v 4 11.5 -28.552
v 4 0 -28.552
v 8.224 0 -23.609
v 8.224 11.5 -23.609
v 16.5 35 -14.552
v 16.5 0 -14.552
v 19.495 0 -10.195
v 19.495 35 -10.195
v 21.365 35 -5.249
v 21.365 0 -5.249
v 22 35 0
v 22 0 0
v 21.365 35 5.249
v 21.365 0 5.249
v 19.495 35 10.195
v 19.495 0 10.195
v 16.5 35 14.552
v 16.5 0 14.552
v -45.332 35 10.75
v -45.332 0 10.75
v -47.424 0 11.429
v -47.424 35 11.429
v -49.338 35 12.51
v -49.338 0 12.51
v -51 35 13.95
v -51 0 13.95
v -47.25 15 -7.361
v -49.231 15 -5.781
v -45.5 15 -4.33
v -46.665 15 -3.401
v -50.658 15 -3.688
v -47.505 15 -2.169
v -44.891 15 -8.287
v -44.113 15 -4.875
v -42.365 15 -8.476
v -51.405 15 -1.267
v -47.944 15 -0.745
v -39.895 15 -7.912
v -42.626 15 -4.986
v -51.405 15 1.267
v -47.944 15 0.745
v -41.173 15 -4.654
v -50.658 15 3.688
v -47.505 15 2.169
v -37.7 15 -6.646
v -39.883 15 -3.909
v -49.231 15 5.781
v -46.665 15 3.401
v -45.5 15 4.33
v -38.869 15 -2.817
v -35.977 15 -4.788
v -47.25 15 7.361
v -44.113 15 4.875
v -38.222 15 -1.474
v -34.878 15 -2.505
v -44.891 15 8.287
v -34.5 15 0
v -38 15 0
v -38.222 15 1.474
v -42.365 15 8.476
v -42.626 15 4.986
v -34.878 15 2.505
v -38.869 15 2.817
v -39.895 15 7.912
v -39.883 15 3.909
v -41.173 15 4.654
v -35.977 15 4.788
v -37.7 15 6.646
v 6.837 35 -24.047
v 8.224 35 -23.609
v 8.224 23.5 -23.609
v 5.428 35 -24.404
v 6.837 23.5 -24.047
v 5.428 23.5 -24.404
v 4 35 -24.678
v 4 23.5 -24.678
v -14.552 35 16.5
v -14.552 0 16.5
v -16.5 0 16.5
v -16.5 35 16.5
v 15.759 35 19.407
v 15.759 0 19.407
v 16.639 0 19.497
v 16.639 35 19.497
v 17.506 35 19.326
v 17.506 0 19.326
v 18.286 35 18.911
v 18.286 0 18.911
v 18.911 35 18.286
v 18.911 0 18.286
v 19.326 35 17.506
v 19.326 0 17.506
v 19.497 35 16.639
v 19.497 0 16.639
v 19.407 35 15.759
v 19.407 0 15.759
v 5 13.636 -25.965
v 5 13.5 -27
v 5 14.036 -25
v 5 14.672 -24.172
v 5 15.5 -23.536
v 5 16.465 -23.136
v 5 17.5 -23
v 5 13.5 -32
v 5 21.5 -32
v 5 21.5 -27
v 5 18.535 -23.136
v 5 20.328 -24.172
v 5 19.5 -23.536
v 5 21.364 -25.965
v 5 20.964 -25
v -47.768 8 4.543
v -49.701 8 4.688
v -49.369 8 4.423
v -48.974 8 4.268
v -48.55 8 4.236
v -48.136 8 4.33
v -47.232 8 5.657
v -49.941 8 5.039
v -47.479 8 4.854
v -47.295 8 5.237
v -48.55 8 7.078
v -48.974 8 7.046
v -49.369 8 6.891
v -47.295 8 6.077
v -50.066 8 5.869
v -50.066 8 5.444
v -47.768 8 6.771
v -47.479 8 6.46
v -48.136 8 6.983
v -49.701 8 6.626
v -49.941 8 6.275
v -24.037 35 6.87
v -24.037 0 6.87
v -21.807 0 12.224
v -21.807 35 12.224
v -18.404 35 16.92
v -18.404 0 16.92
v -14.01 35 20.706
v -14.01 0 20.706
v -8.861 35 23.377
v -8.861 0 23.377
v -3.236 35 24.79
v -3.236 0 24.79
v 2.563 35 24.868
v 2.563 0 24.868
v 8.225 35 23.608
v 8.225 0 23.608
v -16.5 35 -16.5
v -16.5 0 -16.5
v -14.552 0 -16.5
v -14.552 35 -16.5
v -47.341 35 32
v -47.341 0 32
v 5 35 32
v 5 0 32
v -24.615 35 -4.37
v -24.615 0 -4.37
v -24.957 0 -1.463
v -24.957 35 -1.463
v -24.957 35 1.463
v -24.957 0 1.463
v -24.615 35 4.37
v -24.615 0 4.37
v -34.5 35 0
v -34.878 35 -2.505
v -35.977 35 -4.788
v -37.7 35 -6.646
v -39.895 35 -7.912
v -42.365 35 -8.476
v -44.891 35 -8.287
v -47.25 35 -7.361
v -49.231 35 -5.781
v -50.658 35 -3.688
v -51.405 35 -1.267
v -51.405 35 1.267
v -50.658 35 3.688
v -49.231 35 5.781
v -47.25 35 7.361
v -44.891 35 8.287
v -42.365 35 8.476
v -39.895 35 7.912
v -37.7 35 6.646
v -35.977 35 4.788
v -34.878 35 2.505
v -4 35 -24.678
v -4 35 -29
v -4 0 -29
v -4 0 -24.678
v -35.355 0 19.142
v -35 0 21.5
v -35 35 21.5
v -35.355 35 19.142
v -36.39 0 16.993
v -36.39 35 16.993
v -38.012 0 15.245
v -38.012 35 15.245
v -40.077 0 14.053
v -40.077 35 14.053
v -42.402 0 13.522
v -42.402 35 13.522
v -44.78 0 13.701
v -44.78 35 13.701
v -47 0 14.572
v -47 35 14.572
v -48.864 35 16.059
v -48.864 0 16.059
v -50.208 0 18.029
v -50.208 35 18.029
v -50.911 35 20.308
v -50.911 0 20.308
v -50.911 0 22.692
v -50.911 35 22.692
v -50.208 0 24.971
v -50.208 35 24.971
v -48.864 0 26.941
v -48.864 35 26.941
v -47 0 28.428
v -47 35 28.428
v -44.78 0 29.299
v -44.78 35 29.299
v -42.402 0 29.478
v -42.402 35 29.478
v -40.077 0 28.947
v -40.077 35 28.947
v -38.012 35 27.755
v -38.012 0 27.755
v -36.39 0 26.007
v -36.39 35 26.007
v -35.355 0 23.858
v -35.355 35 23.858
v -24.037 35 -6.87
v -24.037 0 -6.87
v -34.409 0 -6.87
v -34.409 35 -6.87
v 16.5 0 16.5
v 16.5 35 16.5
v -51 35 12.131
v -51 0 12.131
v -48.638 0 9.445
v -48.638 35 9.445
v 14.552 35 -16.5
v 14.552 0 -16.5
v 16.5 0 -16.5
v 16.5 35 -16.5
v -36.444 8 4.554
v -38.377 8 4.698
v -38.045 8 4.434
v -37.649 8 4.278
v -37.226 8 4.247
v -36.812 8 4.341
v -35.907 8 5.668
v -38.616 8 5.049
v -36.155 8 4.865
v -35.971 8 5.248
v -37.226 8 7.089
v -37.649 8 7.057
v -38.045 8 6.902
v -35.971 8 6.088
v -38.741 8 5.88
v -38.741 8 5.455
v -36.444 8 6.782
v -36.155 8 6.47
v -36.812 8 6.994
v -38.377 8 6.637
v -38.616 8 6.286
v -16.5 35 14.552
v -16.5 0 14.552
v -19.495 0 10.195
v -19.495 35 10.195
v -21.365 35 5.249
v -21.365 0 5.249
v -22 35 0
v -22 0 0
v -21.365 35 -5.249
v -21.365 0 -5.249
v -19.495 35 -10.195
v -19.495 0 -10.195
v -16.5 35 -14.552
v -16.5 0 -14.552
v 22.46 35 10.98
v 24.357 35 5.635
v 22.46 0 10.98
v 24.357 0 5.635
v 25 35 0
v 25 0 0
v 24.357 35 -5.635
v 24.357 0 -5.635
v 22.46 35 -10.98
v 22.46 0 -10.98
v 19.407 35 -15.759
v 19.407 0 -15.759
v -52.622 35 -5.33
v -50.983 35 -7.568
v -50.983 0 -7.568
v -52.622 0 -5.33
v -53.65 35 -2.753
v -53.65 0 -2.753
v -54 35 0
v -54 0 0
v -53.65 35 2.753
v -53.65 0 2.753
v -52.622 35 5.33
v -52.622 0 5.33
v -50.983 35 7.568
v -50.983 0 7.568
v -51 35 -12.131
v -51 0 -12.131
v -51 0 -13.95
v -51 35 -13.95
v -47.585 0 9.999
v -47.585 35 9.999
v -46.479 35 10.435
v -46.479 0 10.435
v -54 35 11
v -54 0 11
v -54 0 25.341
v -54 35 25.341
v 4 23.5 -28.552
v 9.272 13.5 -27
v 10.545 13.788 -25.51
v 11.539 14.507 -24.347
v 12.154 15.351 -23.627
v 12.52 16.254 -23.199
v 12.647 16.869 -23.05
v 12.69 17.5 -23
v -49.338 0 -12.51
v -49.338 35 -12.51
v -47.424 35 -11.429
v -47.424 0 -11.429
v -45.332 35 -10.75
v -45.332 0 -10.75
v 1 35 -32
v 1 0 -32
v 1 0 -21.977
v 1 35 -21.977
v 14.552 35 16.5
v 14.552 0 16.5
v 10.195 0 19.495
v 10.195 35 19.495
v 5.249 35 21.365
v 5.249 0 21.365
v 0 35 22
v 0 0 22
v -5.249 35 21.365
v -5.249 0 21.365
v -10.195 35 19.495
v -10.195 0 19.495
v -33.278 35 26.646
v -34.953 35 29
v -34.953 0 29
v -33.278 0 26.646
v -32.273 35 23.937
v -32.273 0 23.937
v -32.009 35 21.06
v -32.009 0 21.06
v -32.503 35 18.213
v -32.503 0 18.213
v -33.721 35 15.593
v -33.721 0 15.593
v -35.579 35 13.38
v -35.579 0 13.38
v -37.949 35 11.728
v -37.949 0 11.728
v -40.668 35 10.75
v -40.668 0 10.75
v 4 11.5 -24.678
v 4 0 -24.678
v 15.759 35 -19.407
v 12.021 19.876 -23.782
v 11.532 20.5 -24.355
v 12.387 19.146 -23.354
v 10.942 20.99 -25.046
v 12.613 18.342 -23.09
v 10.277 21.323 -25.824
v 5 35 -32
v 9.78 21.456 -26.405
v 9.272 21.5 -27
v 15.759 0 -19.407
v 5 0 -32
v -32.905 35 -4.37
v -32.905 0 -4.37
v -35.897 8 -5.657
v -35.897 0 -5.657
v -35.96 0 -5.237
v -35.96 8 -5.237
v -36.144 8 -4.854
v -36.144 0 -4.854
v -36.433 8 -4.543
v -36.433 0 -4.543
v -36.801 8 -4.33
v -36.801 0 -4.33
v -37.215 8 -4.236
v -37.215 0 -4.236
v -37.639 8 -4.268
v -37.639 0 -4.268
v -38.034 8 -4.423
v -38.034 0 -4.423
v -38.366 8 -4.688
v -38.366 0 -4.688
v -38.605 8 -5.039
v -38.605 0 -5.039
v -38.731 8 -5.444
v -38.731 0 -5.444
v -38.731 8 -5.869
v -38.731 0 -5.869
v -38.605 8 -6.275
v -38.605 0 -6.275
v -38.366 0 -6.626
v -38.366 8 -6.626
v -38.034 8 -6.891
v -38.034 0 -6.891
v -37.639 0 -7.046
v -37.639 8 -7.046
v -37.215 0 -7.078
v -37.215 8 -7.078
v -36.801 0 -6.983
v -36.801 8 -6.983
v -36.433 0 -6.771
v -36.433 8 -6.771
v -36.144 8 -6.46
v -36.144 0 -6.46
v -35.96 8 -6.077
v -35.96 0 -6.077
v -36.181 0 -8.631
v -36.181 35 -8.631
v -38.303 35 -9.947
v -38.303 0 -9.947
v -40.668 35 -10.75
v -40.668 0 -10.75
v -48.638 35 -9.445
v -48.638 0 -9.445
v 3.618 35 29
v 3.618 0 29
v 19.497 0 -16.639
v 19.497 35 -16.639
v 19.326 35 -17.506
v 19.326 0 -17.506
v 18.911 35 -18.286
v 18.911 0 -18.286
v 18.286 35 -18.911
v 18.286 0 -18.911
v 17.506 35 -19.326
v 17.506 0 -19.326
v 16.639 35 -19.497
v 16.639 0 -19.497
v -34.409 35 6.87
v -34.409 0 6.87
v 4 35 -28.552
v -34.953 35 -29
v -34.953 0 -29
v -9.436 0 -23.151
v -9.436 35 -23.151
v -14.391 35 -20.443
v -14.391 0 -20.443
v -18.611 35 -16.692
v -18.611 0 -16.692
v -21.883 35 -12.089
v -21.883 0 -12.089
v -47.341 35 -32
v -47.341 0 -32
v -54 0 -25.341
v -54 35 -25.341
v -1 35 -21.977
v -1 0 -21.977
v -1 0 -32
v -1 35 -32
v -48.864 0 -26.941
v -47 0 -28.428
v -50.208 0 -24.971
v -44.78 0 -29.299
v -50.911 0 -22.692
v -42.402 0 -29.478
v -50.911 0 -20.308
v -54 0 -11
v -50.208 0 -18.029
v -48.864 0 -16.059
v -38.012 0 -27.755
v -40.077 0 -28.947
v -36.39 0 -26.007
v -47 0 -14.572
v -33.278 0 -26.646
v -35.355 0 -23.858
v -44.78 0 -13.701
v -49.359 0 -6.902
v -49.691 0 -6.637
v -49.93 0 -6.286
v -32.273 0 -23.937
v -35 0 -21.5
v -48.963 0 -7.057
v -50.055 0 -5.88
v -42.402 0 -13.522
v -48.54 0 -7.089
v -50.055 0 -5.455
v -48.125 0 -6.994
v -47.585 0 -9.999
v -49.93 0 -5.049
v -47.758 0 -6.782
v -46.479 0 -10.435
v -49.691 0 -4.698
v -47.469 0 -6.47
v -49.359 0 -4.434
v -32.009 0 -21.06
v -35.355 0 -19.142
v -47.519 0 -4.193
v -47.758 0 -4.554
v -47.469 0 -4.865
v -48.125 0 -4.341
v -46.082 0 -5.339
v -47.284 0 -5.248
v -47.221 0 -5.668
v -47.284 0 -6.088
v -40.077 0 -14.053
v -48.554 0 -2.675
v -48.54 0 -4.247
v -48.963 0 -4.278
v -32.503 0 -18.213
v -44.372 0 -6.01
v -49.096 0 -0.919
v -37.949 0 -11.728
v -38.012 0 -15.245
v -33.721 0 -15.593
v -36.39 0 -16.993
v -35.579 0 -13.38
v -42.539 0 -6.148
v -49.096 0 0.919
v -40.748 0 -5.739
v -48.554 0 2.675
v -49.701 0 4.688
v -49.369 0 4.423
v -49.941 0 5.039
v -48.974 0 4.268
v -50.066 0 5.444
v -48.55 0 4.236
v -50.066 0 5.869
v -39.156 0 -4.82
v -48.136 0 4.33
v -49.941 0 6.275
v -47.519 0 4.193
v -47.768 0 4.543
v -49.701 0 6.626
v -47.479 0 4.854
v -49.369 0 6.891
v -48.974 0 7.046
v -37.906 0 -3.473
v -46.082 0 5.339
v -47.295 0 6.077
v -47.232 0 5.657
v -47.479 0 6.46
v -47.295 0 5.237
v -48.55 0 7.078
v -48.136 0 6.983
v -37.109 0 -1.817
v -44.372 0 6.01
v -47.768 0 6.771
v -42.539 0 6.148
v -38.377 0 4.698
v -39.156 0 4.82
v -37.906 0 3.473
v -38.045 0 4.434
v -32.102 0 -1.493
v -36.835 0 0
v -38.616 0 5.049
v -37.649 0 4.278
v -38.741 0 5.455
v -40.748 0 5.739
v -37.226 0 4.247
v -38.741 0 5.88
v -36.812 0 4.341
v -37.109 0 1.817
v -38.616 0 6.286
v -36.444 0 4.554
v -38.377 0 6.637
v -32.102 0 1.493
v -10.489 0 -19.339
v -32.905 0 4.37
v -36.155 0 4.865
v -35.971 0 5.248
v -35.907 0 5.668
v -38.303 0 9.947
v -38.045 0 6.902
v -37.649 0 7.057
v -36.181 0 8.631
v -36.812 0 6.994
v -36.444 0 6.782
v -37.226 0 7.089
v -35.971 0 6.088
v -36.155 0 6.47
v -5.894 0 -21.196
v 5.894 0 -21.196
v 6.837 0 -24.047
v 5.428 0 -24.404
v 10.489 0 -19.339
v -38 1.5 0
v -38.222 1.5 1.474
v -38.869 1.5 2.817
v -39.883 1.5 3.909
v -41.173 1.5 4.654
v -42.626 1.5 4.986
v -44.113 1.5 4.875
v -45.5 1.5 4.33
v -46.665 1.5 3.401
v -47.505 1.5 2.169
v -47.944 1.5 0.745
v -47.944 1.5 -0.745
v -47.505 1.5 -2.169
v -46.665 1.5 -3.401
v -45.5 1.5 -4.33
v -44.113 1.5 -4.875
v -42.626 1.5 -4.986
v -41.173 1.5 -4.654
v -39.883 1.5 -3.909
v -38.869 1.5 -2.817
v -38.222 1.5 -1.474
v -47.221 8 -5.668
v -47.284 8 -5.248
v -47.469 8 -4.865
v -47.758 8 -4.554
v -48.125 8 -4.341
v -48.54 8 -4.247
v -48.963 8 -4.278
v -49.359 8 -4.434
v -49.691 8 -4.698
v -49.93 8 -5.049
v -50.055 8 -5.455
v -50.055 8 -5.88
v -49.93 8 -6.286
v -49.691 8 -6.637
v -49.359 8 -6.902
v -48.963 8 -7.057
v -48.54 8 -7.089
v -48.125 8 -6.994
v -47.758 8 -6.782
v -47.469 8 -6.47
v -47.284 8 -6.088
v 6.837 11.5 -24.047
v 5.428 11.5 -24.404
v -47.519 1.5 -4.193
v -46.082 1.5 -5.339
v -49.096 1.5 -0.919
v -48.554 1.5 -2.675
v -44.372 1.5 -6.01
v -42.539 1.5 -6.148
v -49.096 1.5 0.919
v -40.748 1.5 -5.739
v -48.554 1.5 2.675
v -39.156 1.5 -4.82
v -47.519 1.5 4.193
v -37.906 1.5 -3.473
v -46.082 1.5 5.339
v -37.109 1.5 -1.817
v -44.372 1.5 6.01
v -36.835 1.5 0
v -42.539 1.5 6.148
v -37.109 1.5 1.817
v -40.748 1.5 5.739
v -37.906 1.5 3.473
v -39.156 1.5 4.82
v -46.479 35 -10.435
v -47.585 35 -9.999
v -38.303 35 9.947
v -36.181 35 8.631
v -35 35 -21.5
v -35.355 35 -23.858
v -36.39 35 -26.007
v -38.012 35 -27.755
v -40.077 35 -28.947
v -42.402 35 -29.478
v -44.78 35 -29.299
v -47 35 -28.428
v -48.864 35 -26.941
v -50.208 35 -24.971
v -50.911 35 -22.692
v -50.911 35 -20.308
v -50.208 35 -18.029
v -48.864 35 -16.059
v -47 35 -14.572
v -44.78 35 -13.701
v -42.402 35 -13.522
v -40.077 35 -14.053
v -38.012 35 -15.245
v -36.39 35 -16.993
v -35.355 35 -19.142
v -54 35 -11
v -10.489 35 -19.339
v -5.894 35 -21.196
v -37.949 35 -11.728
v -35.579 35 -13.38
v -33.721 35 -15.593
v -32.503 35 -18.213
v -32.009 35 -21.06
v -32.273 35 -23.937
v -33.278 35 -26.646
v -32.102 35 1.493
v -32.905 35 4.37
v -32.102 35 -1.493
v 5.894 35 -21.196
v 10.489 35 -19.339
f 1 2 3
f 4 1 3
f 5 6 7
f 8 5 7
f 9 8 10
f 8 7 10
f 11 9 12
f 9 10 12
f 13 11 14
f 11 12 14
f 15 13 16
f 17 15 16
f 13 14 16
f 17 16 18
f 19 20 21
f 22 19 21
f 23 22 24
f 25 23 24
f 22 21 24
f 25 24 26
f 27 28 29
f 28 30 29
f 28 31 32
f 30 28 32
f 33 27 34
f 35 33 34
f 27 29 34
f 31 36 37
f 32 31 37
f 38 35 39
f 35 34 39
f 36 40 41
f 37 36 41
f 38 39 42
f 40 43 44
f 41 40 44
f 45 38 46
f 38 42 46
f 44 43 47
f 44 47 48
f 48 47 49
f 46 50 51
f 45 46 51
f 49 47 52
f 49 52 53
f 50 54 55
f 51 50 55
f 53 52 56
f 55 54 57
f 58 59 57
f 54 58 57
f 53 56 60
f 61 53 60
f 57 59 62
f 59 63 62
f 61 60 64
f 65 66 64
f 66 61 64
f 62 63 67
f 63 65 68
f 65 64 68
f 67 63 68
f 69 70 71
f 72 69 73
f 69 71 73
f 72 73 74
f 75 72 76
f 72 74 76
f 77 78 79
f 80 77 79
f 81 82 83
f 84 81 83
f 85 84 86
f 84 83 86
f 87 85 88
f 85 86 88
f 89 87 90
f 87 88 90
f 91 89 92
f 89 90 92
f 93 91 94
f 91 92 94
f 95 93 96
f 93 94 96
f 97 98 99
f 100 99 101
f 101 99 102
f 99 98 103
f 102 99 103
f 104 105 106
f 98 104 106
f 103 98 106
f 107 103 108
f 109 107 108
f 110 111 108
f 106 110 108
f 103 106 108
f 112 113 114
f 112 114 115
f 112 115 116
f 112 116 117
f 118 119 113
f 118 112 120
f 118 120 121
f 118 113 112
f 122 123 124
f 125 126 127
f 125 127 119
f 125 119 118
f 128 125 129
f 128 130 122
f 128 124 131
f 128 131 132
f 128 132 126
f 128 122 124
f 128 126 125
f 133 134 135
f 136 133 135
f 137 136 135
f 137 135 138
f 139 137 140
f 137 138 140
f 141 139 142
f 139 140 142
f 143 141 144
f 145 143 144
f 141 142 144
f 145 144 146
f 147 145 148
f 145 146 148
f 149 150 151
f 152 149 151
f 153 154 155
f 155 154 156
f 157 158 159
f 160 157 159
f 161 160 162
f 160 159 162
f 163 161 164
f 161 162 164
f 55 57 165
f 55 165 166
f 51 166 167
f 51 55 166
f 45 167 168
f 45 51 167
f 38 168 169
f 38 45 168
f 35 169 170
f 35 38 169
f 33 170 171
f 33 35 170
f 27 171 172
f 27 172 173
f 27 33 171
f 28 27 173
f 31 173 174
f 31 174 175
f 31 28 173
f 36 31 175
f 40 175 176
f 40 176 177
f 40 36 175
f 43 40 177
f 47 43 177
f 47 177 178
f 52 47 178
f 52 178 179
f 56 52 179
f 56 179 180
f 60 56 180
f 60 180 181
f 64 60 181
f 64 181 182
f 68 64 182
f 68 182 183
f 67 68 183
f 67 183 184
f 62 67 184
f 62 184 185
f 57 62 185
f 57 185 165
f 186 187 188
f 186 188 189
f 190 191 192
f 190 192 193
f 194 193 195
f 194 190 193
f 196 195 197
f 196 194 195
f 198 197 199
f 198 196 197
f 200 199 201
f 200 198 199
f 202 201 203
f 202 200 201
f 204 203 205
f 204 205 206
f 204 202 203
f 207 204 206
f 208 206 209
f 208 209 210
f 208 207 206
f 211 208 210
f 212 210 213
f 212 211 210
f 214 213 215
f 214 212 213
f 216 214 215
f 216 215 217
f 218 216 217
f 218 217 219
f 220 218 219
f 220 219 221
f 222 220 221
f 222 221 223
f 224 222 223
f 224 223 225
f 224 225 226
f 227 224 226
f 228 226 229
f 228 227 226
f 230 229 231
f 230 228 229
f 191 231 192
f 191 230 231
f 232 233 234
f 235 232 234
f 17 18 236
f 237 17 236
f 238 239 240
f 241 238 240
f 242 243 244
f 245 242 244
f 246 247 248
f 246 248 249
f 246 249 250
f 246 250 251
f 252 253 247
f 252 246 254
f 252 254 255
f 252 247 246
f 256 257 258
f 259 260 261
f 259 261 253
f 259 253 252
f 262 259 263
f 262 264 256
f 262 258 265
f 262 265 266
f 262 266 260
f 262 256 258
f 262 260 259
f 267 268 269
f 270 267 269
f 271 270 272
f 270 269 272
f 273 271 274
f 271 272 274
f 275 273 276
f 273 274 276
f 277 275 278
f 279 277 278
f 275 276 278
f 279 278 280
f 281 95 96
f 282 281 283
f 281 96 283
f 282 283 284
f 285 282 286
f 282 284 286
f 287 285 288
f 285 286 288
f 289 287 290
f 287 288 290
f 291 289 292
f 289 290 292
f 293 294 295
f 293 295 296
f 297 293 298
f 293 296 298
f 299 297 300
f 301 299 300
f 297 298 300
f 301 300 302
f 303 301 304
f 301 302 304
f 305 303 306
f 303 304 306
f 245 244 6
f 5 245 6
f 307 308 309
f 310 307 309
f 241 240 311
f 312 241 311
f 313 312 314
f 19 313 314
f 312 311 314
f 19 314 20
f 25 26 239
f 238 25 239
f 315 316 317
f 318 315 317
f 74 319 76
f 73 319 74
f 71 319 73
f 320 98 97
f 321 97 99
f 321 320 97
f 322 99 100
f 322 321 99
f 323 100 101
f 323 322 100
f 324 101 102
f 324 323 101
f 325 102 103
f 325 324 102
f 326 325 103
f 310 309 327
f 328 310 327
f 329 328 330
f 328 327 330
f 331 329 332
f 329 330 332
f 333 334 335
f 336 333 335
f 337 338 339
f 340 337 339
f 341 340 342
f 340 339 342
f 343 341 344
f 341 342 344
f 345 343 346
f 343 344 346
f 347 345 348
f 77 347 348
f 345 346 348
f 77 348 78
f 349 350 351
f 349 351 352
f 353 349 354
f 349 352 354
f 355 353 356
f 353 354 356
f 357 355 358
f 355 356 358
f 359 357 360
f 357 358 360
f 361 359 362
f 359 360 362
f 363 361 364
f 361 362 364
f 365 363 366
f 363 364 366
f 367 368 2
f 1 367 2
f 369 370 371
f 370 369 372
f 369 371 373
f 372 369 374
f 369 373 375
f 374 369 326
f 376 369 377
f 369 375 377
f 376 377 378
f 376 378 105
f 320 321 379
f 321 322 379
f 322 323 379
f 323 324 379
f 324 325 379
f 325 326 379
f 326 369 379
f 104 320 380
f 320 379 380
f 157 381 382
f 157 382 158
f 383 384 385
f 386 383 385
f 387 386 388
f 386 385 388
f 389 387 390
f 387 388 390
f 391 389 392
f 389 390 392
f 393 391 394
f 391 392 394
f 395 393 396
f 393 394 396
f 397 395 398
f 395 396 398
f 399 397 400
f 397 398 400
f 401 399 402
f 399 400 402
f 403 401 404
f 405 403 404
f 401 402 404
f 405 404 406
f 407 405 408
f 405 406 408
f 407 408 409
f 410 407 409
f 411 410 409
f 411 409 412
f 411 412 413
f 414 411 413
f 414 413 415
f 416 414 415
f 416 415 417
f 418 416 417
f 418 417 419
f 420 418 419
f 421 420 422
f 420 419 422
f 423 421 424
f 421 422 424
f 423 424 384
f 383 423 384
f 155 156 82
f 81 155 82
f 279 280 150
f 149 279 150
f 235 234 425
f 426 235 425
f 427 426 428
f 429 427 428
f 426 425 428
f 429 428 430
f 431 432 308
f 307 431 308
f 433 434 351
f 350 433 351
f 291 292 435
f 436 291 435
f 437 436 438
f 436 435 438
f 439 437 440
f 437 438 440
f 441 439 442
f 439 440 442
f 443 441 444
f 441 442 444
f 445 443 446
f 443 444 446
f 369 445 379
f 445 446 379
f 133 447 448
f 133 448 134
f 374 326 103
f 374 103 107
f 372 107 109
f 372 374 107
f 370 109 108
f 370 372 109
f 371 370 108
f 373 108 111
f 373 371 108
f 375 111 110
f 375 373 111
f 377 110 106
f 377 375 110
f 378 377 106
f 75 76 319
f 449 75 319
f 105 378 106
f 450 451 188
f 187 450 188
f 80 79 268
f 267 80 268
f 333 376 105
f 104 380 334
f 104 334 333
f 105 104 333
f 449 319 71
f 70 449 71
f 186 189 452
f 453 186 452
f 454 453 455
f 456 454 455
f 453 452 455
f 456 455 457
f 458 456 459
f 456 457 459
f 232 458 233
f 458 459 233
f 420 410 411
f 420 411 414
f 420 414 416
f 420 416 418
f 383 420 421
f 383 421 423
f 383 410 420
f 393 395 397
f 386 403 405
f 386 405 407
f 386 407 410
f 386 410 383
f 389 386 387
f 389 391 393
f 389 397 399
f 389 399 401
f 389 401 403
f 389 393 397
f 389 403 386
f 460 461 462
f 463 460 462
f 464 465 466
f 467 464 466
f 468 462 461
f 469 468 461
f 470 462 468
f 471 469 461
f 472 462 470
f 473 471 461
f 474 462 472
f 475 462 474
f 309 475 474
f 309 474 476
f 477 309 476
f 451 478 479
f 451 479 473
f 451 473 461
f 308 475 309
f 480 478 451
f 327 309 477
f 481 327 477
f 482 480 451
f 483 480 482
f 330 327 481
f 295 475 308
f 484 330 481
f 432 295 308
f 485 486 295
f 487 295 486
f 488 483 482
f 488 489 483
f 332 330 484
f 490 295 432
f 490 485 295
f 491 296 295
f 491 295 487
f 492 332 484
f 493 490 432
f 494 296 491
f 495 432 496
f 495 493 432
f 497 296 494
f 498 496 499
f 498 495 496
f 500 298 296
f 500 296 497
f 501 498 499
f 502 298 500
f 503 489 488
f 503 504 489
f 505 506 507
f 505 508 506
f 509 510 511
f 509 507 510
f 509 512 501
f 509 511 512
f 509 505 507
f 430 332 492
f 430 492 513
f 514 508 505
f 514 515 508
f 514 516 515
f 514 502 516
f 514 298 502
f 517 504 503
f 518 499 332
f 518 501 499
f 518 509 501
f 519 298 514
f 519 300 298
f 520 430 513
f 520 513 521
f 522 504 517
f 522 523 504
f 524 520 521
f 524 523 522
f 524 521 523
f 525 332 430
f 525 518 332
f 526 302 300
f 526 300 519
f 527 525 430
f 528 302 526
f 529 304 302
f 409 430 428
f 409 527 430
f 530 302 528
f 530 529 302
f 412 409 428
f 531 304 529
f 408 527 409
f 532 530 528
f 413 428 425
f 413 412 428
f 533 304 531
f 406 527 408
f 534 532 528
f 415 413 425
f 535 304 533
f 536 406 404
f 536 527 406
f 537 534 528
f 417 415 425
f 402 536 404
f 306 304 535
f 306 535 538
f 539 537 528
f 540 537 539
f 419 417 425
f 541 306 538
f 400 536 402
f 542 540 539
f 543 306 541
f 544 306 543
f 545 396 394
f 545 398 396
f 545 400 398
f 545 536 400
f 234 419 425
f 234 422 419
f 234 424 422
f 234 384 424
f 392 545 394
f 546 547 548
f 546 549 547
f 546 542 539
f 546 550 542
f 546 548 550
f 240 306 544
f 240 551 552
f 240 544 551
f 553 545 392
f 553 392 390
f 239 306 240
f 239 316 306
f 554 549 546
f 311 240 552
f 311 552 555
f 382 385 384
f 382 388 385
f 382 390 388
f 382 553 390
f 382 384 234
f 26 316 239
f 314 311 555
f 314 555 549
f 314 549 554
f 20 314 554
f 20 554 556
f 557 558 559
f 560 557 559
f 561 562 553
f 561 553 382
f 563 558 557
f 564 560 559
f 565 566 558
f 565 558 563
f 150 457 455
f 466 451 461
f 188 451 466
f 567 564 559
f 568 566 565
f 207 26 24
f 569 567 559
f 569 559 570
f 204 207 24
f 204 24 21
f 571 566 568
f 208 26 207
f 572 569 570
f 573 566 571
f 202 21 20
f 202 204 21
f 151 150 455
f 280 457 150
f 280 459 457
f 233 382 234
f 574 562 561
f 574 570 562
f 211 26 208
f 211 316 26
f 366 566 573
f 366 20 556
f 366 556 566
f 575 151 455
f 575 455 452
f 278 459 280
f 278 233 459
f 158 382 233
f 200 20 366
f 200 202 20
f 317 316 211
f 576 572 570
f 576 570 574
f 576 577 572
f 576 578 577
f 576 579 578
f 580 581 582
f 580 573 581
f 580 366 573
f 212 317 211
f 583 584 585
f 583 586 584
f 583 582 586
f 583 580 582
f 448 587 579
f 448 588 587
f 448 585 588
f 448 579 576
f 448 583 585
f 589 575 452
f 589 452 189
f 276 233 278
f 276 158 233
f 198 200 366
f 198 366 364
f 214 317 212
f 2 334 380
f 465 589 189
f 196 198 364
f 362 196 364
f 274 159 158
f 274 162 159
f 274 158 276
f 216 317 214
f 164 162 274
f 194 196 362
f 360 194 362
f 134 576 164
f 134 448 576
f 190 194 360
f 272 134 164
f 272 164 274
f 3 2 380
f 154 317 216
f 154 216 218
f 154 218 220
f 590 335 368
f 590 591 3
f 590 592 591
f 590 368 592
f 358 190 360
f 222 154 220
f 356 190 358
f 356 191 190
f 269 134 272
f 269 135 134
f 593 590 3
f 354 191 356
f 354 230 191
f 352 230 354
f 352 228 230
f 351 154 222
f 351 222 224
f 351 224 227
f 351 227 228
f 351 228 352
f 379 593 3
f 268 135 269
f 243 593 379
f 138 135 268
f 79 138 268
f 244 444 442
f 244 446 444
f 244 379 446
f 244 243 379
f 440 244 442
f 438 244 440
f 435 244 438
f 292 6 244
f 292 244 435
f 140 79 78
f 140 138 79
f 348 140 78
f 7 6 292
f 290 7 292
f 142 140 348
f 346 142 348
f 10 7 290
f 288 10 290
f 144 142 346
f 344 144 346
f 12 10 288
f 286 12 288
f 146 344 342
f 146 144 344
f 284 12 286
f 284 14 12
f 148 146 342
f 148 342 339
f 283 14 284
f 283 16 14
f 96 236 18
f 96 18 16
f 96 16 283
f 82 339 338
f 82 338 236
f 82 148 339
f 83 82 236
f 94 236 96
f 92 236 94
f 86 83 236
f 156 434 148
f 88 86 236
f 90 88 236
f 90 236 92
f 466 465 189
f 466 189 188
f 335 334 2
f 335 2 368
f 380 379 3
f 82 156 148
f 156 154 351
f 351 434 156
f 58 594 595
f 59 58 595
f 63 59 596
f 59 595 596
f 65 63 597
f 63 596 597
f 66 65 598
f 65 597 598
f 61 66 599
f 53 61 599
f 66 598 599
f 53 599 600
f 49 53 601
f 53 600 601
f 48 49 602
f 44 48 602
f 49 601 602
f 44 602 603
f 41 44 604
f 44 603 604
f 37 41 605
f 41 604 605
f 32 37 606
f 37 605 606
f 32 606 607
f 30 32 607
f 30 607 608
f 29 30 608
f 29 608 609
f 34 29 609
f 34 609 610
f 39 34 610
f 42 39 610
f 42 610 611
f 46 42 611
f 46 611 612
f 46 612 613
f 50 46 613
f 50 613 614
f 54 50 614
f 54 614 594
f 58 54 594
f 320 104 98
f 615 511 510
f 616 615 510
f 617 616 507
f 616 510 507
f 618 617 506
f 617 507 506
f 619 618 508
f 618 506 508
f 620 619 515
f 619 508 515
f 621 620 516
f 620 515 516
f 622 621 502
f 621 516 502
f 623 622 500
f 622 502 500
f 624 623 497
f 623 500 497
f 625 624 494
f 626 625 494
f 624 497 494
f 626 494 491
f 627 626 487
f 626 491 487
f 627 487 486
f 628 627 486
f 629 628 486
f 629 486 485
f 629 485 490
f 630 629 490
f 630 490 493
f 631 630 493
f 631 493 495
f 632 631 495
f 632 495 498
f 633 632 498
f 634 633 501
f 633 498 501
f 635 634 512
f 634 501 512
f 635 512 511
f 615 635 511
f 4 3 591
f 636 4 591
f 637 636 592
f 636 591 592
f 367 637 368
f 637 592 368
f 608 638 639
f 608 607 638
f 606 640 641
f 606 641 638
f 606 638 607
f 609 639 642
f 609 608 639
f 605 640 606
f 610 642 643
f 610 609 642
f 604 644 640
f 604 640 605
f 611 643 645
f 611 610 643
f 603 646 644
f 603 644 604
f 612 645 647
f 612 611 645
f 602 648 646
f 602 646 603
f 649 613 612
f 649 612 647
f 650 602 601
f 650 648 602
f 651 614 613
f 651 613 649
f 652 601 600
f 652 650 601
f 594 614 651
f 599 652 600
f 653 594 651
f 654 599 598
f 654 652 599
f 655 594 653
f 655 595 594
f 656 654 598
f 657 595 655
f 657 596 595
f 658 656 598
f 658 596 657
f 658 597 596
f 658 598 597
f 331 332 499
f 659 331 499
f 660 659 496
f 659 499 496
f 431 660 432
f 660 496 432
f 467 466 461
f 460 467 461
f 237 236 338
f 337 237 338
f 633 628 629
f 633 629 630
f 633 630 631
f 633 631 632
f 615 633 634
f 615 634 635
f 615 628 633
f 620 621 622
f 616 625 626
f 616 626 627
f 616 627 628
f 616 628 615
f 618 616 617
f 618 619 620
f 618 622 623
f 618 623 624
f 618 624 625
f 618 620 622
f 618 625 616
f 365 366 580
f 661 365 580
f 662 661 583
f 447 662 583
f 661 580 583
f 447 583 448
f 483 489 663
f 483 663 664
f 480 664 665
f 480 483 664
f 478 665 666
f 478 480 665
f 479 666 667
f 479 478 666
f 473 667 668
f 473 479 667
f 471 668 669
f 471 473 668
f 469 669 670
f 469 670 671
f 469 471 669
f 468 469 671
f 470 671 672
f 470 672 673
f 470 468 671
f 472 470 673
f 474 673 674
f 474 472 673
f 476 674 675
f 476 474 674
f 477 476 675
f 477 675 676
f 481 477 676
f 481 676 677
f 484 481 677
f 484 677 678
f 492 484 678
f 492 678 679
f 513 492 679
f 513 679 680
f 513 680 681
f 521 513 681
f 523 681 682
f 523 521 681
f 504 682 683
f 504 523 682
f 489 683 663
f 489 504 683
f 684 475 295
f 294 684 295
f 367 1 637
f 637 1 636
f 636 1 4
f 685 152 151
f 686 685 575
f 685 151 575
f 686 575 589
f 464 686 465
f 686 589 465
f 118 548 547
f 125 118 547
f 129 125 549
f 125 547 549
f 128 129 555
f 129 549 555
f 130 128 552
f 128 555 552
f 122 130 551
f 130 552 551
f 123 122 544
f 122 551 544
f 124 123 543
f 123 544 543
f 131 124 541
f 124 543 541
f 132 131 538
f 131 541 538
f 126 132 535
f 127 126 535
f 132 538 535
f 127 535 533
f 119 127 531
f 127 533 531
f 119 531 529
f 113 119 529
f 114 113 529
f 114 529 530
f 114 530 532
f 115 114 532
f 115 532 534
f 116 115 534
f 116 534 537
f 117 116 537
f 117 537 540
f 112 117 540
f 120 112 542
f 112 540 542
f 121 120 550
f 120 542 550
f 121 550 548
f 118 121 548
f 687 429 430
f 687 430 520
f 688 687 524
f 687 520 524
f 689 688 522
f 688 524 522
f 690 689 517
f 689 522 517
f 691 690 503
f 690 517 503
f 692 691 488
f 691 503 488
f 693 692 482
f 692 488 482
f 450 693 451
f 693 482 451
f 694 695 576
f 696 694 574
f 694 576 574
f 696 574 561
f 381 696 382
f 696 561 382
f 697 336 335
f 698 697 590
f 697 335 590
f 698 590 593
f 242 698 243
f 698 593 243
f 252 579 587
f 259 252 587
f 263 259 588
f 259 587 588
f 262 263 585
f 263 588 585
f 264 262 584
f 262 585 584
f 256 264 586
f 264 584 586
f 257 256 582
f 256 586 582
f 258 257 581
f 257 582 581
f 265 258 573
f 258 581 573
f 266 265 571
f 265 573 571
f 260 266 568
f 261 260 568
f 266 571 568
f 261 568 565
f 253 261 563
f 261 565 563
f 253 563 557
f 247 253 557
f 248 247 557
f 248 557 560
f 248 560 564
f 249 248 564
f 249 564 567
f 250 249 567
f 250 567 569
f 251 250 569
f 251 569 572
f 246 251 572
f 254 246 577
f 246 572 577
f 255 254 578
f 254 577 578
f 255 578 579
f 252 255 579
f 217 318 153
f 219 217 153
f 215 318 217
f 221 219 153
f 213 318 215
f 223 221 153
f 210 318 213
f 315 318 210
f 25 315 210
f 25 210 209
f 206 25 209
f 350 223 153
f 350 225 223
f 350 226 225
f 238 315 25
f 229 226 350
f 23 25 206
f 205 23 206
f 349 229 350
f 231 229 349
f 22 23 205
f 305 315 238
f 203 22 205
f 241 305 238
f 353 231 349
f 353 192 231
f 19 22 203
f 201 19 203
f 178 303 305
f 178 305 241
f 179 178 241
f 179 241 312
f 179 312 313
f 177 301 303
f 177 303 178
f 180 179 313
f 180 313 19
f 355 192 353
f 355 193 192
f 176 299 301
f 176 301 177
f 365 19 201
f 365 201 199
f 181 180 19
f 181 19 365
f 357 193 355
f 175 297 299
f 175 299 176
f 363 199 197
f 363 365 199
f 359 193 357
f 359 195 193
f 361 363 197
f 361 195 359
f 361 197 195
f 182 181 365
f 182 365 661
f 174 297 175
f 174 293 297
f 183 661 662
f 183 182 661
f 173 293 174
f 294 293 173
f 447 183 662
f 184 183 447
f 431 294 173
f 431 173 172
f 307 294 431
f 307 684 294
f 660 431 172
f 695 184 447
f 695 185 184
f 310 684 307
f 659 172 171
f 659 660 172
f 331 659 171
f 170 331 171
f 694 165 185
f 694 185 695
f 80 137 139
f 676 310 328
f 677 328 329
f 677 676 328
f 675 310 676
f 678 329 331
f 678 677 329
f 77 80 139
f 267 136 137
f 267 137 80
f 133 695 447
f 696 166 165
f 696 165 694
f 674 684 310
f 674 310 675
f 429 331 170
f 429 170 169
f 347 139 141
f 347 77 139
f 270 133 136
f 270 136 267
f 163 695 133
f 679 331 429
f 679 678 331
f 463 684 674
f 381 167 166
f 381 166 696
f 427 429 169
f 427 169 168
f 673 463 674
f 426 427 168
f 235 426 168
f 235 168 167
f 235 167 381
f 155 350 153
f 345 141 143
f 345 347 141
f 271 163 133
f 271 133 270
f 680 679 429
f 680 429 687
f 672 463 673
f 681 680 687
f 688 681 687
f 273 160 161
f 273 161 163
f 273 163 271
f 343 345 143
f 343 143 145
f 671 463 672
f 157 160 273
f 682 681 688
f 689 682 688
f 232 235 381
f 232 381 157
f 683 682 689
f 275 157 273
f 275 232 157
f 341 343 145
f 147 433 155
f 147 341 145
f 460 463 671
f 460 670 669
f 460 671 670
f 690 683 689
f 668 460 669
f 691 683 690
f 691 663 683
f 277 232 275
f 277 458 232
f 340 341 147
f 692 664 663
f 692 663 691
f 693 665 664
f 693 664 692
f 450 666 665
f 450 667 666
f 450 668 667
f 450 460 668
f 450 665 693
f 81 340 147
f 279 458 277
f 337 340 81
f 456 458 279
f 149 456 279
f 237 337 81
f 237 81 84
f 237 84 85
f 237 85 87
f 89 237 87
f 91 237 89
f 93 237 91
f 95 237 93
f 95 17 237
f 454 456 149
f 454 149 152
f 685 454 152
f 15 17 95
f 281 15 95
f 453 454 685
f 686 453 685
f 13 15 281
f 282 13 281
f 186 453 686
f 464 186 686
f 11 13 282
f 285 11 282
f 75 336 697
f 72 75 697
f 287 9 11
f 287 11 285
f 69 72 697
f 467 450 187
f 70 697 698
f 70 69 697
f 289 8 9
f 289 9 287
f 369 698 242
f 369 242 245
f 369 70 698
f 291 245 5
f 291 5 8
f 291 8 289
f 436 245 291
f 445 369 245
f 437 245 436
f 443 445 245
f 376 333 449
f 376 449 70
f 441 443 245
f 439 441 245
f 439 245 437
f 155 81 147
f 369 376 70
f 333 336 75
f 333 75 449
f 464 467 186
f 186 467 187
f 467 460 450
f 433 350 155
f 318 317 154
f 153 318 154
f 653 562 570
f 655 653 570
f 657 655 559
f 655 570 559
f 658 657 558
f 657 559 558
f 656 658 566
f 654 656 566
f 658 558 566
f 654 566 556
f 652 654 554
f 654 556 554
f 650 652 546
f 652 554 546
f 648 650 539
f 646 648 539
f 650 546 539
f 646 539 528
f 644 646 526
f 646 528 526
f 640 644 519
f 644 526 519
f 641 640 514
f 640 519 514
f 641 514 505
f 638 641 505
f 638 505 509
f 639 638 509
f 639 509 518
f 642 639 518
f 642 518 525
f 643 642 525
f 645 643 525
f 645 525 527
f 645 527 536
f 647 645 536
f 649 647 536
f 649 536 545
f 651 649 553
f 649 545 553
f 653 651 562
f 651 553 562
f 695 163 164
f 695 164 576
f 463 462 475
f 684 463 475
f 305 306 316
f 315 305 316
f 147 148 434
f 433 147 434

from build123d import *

# Parameters (mm, degrees)
SKETCH1_R           = 8
SKETCH1_R_2         = 8.5
BOSS_EXTRUDE1_DEPTH = 35
BOSS_EXTRUDE3_DEPTH = 12
CUT_EXTRUDE1_DEPTH  = 14.407172
SKETCH7_R           = 8.5
BOSS_EXTRUDE4_DEPTH = 15
SKETCH7_3_R         = 5
CUT_EXTRUDE2_DEPTH  = 15
SKETCH7_4_R         = 6.165
CUT_EXTRUDE3_DEPTH  = 1.5
SKETCH7_5_R         = 1.425
CUT_EXTRUDE4_DEPTH  = 8


with BuildPart() as part:
    # Sketch1 → Boss-Extrude1 (new body)
    with BuildSketch(Plane(origin=(0, 0, 0), x_dir=(1, 0, 0), z_dir=(0, 1, 0))):
        with BuildLine():
            ThreePointArc((-50.982546594, 7.568285795), (-54, 0), (-50.982546594, -7.568285795))
            Line((-50.982546594, -7.568285795), (-54, -11))
            Line((-54, -11), (-54, -25.34082208))
            Line((-54, -25.34082208), (-47.34082208, -32))
            Line((-47.34082208, -32), (5, -32))
            Line((5, -32), (15.759494281, -19.407172386))
            ThreePointArc((15.759494281, -19.407172386), (18.621320344, -18.621320344), (19.407172386, -15.759494281))
            ThreePointArc((19.407172386, -15.759494281), (25, 0), (19.407172386, 15.759494281))
            ThreePointArc((19.407172386, 15.759494281), (18.621320344, 18.621320344), (15.759494281, 19.407172386))
            Line((15.759494281, 19.407172386), (5, 32))
            Line((5, 32), (1, 32))
            Line((1, 32), (1, 21.977260976))
            ThreePointArc((1, 21.977260976), (8.243992543, 20.396974946), (14.551632211, 16.5))
            Line((14.551632211, 16.5), (16.5, 16.5))
            Line((16.5, 16.5), (16.5, 14.551632211))
            ThreePointArc((16.5, 14.551632211), (22, 0), (16.5, -14.551632211))
            Line((16.5, -14.551632211), (16.5, -16.5))
            Line((16.5, -16.5), (14.551632211, -16.5))
            ThreePointArc((14.551632211, -16.5), (0, -22), (-14.551632211, -16.5))
            Line((-14.551632211, -16.5), (-16.5, -16.5))
            Line((-16.5, -16.5), (-16.5, -14.551632211))
            ThreePointArc((-16.5, -14.551632211), (-22, 0), (-16.5, 14.551632211))
            Line((-16.5, 14.551632211), (-16.5, 16.5))
            Line((-16.5, 16.5), (-14.551632211, 16.5))
            ThreePointArc((-14.551632211, 16.5), (-8.243992543, 20.396974946), (-1, 21.977260976))
            Line((-1, 21.977260976), (-1, 32))
            Line((-1, 32), (-47.34082208, 32))
            Line((-47.34082208, 32), (-54, 25.34082208))
            Line((-54, 25.34082208), (-54, 11))
            Line((-54, 11), (-50.982546594, 7.568285795))
        make_face()
        with BuildLine():
            ThreePointArc((-48.638105805, -9.445197877), (-47.038026147, -10.232025451), (-45.331844763, -10.75))
            ThreePointArc((-45.331844763, -10.75), (-48.408051309, -11.921222362), (-51, -13.950165565))
            Line((-51, -13.950165565), (-51, -12.131352314))
            Line((-51, -12.131352314), (-48.638105805, -9.445197877))
        make_face(mode=Mode.SUBTRACT)
        with Locations((-43, -21.5)):
            Circle(SKETCH1_R, mode=Mode.SUBTRACT)
        with BuildLine():
            ThreePointArc((-34.95326153, -29), (-32.502649264, -18.212808567), (-40.668155237, -10.75))
            ThreePointArc((-40.668155237, -10.75), (-37.204464997, -9.349426401), (-34.409357086, -6.870287791))
            Line((-34.409357086, -6.870287791), (-24.037452978, -6.870287791))
            ThreePointArc((-24.037452978, -6.870287791), (-11.513133706, -22.191163833), (8.224630177, -23.60837687))
            Line((8.224630177, -23.60837687), (3.617949295, -29))
            Line((3.617949295, -29), (-34.95326153, -29))
        make_face(mode=Mode.SUBTRACT)
        with Locations((-43, 0)):
            Circle(SKETCH1_R_2, mode=Mode.SUBTRACT)
        with BuildLine():
            ThreePointArc((-45.331844763, 10.75), (-47.038026147, 10.232025451), (-48.638105805, 9.445197877))
            Line((-48.638105805, 9.445197877), (-51, 12.131352314))
            Line((-51, 12.131352314), (-51, 13.950165565))
            ThreePointArc((-51, 13.950165565), (-48.408051309, 11.921222362), (-45.331844763, 10.75))
        make_face(mode=Mode.SUBTRACT)
        with BuildLine():
            ThreePointArc((-32.905418056, -4.370287791), (-32, 0), (-32.905418056, 4.370287791))
            Line((-32.905418056, 4.370287791), (-24.615047931, 4.370287791))
            ThreePointArc((-24.615047931, 4.370287791), (-25, 0), (-24.615047931, -4.370287791))
            Line((-24.615047931, -4.370287791), (-32.905418056, -4.370287791))
        make_face(mode=Mode.SUBTRACT)
        with Locations((-43, 21.5)):
            Circle(SKETCH1_R, mode=Mode.SUBTRACT)
        with BuildLine():
            ThreePointArc((-34.409357086, 6.870287791), (-37.204464997, 9.349426401), (-40.668155237, 10.75))
            ThreePointArc((-40.668155237, 10.75), (-32.502649264, 18.212808567), (-34.95326153, 29))
            Line((-34.95326153, 29), (-4, 29))
            Line((-4, 29), (-4, 24.677925359))
            ThreePointArc((-4, 24.677925359), (-16.607308069, 18.68682206), (-24.037452978, 6.870287791))
            Line((-24.037452978, 6.870287791), (-34.409357086, 6.870287791))
        make_face(mode=Mode.SUBTRACT)
        with BuildLine():
            ThreePointArc((8.223751321, 23.608683026), (6.135213434, 24.235493725), (4, 24.677925359))
            Line((4, 24.677925359), (4, 28.552128404))
            Line((4, 28.552128404), (8.223751321, 23.608683026))
        make_face(mode=Mode.SUBTRACT)
    extrude(amount=BOSS_EXTRUDE1_DEPTH)

    # Sketch6 → Boss-Extrude3 (add)
    with BuildSketch(Plane(origin=(0, 23.5, 0), x_dir=(0, 0, -1), z_dir=(0, -1, 0))):
        Polygon((30.717367885, 3.963704263), (22.785433959, 3.963704263), (22.785433959, 10.604126234), align=None)
    extrude(amount=BOSS_EXTRUDE3_DEPTH)

    # Sketch3 → Cut-Extrude1 (cut)
    with BuildSketch(Plane.ZY.offset(-19.407172386)):
        with BuildLine():
            ThreePointArc((-23, 17.5), (-24.171572875, 20.328427125), (-27, 21.5))
            Line((-27, 21.5), (-27, 13.5))
            ThreePointArc((-27, 13.5), (-24.171572875, 14.671572875), (-23, 17.5))
        make_face()
        with BuildLine():
            Line((-27, 13.5), (-27, 21.5))
            ThreePointArc((-27, 21.5), (-31, 17.5), (-27, 13.5))
        make_face()
        with BuildLine():
            Line((-27, 21.5), (-32, 21.5))
            Line((-32, 21.5), (-32, 13.5))
            Line((-32, 13.5), (-27, 13.5))
            ThreePointArc((-27, 13.5), (-31, 17.5), (-27, 21.5))
        make_face()
    extrude(amount=CUT_EXTRUDE1_DEPTH, mode=Mode.SUBTRACT)

    # Sketch7 → Boss-Extrude4 (add)
    with BuildSketch(Plane.XZ):
        with Locations((-43, 0)):
            Circle(SKETCH7_R)
    extrude(amount=-BOSS_EXTRUDE4_DEPTH)

    # Sketch7<3> → Cut-Extrude2 (cut)
    with BuildSketch(Plane.XZ):
        with Locations((-43, 0)):
            Circle(SKETCH7_3_R)
    extrude(amount=-CUT_EXTRUDE2_DEPTH, mode=Mode.SUBTRACT)

    # Sketch7<4> → Cut-Extrude3 (cut)
    with BuildSketch(Plane.XZ):
        with Locations((-43, 0)):
            Circle(SKETCH7_4_R)
    extrude(amount=-CUT_EXTRUDE3_DEPTH, mode=Mode.SUBTRACT)

    # Sketch7<5> → Cut-Extrude4 (cut)
    with BuildSketch(Plane.XZ):
        with Locations((-48.64603005, -5.667657777)):
            Circle(SKETCH7_5_R)
        with Locations((-48.656854249, 5.656854249)):
            Circle(SKETCH7_5_R)
        with Locations((-37.332342223, 5.667678449)):
            Circle(SKETCH7_5_R)
        with Locations((-37.321518023, -5.656833577)):
            Circle(SKETCH7_5_R)
    extrude(amount=-CUT_EXTRUDE4_DEPTH, mode=Mode.SUBTRACT)


solid = part.part
